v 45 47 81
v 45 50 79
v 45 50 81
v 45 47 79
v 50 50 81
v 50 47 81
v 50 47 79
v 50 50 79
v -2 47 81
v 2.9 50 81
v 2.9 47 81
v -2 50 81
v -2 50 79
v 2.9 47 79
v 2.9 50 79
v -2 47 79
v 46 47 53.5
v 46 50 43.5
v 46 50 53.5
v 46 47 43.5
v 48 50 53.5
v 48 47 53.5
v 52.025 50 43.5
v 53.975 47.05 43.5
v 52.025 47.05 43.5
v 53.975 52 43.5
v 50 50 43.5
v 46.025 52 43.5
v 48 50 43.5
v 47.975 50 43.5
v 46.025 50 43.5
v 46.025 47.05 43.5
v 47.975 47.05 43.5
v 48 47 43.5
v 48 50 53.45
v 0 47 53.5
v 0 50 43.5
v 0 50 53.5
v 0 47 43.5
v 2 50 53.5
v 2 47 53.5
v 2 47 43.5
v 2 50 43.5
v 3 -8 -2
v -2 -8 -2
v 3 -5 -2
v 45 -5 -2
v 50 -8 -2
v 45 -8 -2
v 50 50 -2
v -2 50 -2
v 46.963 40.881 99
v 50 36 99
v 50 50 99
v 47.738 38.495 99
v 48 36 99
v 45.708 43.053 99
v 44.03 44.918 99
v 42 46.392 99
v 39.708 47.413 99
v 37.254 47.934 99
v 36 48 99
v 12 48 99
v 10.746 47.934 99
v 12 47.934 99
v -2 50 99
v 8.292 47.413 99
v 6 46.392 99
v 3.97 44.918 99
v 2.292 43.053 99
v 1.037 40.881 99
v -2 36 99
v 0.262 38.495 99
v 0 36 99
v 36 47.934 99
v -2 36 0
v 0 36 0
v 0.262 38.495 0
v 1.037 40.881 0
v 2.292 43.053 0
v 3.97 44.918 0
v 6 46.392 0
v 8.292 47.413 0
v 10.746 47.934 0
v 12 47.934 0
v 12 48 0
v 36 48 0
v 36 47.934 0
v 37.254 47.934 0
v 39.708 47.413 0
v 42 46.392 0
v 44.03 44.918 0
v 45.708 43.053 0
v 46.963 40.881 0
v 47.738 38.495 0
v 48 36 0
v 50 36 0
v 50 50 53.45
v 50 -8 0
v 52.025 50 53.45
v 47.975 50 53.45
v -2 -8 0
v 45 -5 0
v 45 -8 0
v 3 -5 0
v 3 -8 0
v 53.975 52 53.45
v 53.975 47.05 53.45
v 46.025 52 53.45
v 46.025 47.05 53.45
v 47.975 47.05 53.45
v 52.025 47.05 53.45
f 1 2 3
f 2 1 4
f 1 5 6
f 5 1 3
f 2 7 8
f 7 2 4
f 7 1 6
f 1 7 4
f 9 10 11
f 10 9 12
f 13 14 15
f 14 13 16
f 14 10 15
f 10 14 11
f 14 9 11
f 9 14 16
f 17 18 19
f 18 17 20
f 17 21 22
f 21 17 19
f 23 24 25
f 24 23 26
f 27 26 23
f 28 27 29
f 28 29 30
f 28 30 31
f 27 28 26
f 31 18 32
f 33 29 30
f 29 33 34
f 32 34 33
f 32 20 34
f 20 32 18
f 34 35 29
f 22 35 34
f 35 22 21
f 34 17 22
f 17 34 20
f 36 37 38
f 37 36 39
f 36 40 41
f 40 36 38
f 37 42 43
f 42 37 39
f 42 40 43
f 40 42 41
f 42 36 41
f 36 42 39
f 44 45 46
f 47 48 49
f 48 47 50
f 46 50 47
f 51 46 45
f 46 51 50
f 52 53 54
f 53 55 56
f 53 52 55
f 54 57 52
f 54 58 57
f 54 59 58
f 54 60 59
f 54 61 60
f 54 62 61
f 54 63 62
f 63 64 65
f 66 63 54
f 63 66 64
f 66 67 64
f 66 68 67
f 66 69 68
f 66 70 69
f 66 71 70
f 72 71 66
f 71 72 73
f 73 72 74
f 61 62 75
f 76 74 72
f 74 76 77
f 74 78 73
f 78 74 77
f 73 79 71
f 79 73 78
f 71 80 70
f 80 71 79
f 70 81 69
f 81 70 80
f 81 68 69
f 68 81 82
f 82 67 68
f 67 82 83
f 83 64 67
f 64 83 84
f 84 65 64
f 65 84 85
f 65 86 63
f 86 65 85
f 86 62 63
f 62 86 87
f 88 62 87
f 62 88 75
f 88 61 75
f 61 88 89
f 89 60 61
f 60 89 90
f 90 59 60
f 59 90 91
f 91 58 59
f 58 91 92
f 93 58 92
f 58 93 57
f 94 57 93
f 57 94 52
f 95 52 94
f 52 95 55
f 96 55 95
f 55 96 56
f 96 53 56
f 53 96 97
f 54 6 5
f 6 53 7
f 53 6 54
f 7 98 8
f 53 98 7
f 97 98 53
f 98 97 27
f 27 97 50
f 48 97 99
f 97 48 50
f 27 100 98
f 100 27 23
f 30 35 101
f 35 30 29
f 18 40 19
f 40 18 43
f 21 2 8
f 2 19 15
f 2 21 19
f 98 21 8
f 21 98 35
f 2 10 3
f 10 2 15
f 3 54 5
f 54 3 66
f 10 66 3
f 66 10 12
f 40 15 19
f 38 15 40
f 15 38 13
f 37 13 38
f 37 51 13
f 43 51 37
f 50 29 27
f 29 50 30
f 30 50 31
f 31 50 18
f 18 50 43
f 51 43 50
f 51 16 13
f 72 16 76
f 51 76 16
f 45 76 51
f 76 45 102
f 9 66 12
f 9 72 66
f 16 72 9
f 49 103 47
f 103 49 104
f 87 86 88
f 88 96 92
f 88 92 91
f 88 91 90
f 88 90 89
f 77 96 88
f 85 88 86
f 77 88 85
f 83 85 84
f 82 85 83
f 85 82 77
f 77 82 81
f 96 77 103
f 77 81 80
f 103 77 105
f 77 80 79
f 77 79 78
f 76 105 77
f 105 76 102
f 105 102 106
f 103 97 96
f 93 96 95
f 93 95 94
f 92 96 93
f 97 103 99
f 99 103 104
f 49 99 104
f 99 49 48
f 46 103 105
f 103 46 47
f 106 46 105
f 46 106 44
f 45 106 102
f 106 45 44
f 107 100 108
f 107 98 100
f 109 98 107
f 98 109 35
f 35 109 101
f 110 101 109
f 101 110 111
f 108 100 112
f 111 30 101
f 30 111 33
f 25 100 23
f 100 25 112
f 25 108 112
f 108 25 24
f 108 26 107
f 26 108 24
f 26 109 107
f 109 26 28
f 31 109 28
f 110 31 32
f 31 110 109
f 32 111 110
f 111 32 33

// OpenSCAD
// file: ../jars/jar-rectangular-99x48.scad
function jar_height() = 99; // millimeters
function jar_width() = 48;
function jar_round_edge_radius() = 12;

module jar() {
    linear_extrude(height = jar_height())
    hull() {
        translate([jar_round_edge_radius(), jar_round_edge_radius()]) circle(r = jar_round_edge_radius());
        translate([jar_width() - jar_round_edge_radius(), jar_round_edge_radius()]) circle(r = jar_round_edge_radius());
        translate([jar_width() - jar_round_edge_radius(), jar_width() - jar_round_edge_radius()]) circle(r = jar_round_edge_radius());
        translate([jar_round_edge_radius(), jar_width() - jar_round_edge_radius()]) circle(r = jar_round_edge_radius());
    }
}

jar();
// file: ../drawers/drawer-780x470x255.scad
// These are the usable inner dimension of the drawer.
function drawer_inner_depth() = 471; // millimeters
function drawer_inner_width() = 780;
function drawer_inner_front_height() = 255;
function drawer_inner_back_height() = 160;
function drawer_inner_height() = max(drawer_inner_front_height(), drawer_inner_back_height());

function drawer_side_wall_thickness() = 15; // Does not matter in regards to usable space

module drawer_bottom() {
    width = drawer_inner_width() + 2* drawer_side_wall_thickness();
    height = drawer_side_wall_thickness();
    depth = drawer_inner_depth() + 2* drawer_side_wall_thickness();

    // make the innner space of the drawer aligned with coordinates [0,0,0]
    offset_x = -drawer_side_wall_thickness();
    offset_y = -drawer_side_wall_thickness();
    offset_z = -drawer_side_wall_thickness();

    translate([offset_x, offset_y, offset_z]) cube([width, depth, height]);
}

module drawer_front() {
    width = drawer_inner_width() + 2* drawer_side_wall_thickness();
    height = drawer_inner_height();
    depth = drawer_side_wall_thickness();

    offset_x = -drawer_side_wall_thickness();
    offset_y = -drawer_side_wall_thickness();
    offset_z = -drawer_side_wall_thickness();

    handle_width = 160;
    handle_depth = 20;
    handle_height = 20;

    // make the innner space of the drawer aligned with coordinates [0,0,0]
    handle_offset_x = offset_x + width / 2 - handle_width / 2;
    handle_offset_y = offset_y - handle_depth;
    handle_offset_z = offset_z + height / 2 - handle_height / 2;

    union() {
        // front panel
        translate([offset_x, offset_y, offset_z]) cube([width, depth, height]);
        translate([handle_offset_x, handle_offset_y, handle_offset_z]) {
            cube([handle_width, handle_depth, handle_height]);
        }
    }
}

module drawer_side(s = "left") {
    width = drawer_side_wall_thickness();
    height = drawer_inner_height();
    depth = drawer_inner_depth() + 2* drawer_side_wall_thickness();

    offset_y = -drawer_side_wall_thickness();
    offset_z = -drawer_side_wall_thickness();
    if (s == "right") {
        offset_x = drawer_inner_width() + drawer_side_wall_thickness();
        translate([offset_x, offset_y, offset_z]) cube([width, depth, height]);
    } else {
        offset_x = -drawer_side_wall_thickness();
        translate([offset_x, offset_y, offset_z]) cube([width, depth, height]);
    }
}

module drawer_back() {
    width = drawer_inner_width() + 2* drawer_side_wall_thickness();
    height = drawer_inner_back_height();
    depth = drawer_side_wall_thickness();

    offset_x = -drawer_side_wall_thickness();
    offset_y = drawer_inner_depth();
    offset_z = -drawer_side_wall_thickness();

    translate([offset_x, offset_y, offset_z]) cube([width, depth, height]);
}

module drawer() {
    union() {
        drawer_bottom();
        drawer_front();
        drawer_side(s = "left");
        drawer_side(s = "right");
        drawer_back();
    }
}

drawer();
// main file
use <../drawers/drawer-780x470x255.scad>;
use <../jars/jar-rectangular-99x48.scad>;

function side_wall_minimum_thickness() = 2;
function foot_wall_minimum_thickness() = side_wall_minimum_thickness();
function organizer_width() = jar_width() + side_wall_minimum_thickness() * 2;
function side_length() = jar_height() + side_wall_minimum_thickness();
function side_height() = jar_round_edge_radius();

function side_attachment_slot_width() = 5;
function side_attachment_slot_depth() = 3;

function row_attachment_slot_length() = 10;
function row_attachment_slot_width() = 2;
function row_attachment_slot_depth() = 3;
function row_attachment_distance_from_edge() = 2;

function row_attachment_pin_wall_thickness() = side_wall_minimum_thickness();
function row_attachment_pin_loose_fit() = 0.05;
function row_attachment_pin_width() = row_attachment_distance_from_edge() * 4 - row_attachment_pin_loose_fit();

module row_attachment_slot() {
    diff_workaround = 0.1;

    offset_x = row_attachment_distance_from_edge();
    offset_y = - diff_workaround;
    offset_z = side_length() / 2 - row_attachment_slot_length() / 2;
    depth = row_attachment_slot_depth() + diff_workaround;

    translate([offset_x, offset_y, offset_z]) cube([row_attachment_slot_width(), depth, row_attachment_slot_length()]);

    other_side_offset_x = organizer_width() - row_attachment_distance_from_edge() - row_attachment_slot_width();
    translate([other_side_offset_x, offset_y, offset_z]) cube([row_attachment_slot_width(), depth, row_attachment_slot_length()]);
}

module row_attachment_pin() {
    length = row_attachment_slot_length() - row_attachment_pin_loose_fit();
    depth = row_attachment_slot_depth() - row_attachment_pin_loose_fit();
    width = row_attachment_slot_width() - row_attachment_pin_loose_fit();

    pin_offset_x = organizer_width() - row_attachment_pin_width() / 2 - side_wall_minimum_thickness();
    pin_offset_y = organizer_width() - row_attachment_pin_wall_thickness();
    pin_offset_z = side_length() / 2 - row_attachment_slot_length() / 2 - foot_wall_minimum_thickness();

    translate([pin_offset_x, pin_offset_y, pin_offset_z])
    linear_extrude(length) {
        union() {
            square([row_attachment_pin_width(), row_attachment_pin_wall_thickness()]);
            translate([0, - depth]) square([width, depth]);
            translate([row_attachment_pin_width() - width, - depth]) square([width, depth]);
        }
    }
}

module organizer_side(ol = 0) {
    diff_workaround = 0.1;

    difference() {
        linear_extrude(side_length())
        difference() {
            square([organizer_width(), side_height() + side_wall_minimum_thickness()]);
            translate([jar_round_edge_radius() + side_wall_minimum_thickness(), jar_round_edge_radius() + side_wall_minimum_thickness()])circle(jar_round_edge_radius());
            translate([jar_width() - jar_round_edge_radius() + side_wall_minimum_thickness(), jar_round_edge_radius() + side_wall_minimum_thickness()])circle(jar_round_edge_radius());
            translate([side_wall_minimum_thickness() + jar_round_edge_radius(), side_wall_minimum_thickness()]) square([jar_width() - 2 * jar_round_edge_radius(), side_height()]);
        }

        if (ol > 0) {
            offset_z = side_length() - ol - foot_wall_minimum_thickness();
            translate([- diff_workaround, - diff_workaround, offset_z]) cube([side_attachment_slot_width() + diff_workaround, side_attachment_slot_depth() + diff_workaround, foot_wall_minimum_thickness()]);

            offset_x = organizer_width() - side_attachment_slot_width() + diff_workaround;
            translate([offset_x, - diff_workaround, offset_z]) cube([side_attachment_slot_width() + diff_workaround, side_attachment_slot_depth() + diff_workaround, foot_wall_minimum_thickness()]);
        }

        row_attachment_slot();
    }
}

module organizer_foot(lf = 0, ol = 0, fp = false) {
    attachmen_slot_offset_y = organizer_width() + lf;
    attachmen_slot_offset_x = organizer_width() - side_attachment_slot_width();
    union() {
        cube([organizer_width(), organizer_width() + lf, foot_wall_minimum_thickness()]);
        if (fp) {
            translate([0, attachmen_slot_offset_y, 0]) cube([side_attachment_slot_width(), side_attachment_slot_depth(), foot_wall_minimum_thickness()]);
            translate([attachmen_slot_offset_x, attachmen_slot_offset_y, 0]) cube([side_attachment_slot_width(), side_attachment_slot_depth(), foot_wall_minimum_thickness()]);
        }
    }
}

module organizer(
    ol = 0, // overlap - used to determine where the foot of the next organizer will attach to the side of the current one
    lf = 0, // loose fit - distance between two organizers so it is easy to slide in jar into overlapping organizers
    fp = false, // add attachment pins to foot
) {
    translate([jar_width() + side_wall_minimum_thickness(), jar_width() + side_wall_minimum_thickness(), -side_wall_minimum_thickness()])
    rotate([0, 0, 180])
    difference() {
        union() {
            organizer_side(ol);
            organizer_foot(lf = lf, ol = ol, fp = fp);
        }
    }
}

organizer(lf = 3, ol = 18, fp = true);
color("blue") row_attachment_pin();
